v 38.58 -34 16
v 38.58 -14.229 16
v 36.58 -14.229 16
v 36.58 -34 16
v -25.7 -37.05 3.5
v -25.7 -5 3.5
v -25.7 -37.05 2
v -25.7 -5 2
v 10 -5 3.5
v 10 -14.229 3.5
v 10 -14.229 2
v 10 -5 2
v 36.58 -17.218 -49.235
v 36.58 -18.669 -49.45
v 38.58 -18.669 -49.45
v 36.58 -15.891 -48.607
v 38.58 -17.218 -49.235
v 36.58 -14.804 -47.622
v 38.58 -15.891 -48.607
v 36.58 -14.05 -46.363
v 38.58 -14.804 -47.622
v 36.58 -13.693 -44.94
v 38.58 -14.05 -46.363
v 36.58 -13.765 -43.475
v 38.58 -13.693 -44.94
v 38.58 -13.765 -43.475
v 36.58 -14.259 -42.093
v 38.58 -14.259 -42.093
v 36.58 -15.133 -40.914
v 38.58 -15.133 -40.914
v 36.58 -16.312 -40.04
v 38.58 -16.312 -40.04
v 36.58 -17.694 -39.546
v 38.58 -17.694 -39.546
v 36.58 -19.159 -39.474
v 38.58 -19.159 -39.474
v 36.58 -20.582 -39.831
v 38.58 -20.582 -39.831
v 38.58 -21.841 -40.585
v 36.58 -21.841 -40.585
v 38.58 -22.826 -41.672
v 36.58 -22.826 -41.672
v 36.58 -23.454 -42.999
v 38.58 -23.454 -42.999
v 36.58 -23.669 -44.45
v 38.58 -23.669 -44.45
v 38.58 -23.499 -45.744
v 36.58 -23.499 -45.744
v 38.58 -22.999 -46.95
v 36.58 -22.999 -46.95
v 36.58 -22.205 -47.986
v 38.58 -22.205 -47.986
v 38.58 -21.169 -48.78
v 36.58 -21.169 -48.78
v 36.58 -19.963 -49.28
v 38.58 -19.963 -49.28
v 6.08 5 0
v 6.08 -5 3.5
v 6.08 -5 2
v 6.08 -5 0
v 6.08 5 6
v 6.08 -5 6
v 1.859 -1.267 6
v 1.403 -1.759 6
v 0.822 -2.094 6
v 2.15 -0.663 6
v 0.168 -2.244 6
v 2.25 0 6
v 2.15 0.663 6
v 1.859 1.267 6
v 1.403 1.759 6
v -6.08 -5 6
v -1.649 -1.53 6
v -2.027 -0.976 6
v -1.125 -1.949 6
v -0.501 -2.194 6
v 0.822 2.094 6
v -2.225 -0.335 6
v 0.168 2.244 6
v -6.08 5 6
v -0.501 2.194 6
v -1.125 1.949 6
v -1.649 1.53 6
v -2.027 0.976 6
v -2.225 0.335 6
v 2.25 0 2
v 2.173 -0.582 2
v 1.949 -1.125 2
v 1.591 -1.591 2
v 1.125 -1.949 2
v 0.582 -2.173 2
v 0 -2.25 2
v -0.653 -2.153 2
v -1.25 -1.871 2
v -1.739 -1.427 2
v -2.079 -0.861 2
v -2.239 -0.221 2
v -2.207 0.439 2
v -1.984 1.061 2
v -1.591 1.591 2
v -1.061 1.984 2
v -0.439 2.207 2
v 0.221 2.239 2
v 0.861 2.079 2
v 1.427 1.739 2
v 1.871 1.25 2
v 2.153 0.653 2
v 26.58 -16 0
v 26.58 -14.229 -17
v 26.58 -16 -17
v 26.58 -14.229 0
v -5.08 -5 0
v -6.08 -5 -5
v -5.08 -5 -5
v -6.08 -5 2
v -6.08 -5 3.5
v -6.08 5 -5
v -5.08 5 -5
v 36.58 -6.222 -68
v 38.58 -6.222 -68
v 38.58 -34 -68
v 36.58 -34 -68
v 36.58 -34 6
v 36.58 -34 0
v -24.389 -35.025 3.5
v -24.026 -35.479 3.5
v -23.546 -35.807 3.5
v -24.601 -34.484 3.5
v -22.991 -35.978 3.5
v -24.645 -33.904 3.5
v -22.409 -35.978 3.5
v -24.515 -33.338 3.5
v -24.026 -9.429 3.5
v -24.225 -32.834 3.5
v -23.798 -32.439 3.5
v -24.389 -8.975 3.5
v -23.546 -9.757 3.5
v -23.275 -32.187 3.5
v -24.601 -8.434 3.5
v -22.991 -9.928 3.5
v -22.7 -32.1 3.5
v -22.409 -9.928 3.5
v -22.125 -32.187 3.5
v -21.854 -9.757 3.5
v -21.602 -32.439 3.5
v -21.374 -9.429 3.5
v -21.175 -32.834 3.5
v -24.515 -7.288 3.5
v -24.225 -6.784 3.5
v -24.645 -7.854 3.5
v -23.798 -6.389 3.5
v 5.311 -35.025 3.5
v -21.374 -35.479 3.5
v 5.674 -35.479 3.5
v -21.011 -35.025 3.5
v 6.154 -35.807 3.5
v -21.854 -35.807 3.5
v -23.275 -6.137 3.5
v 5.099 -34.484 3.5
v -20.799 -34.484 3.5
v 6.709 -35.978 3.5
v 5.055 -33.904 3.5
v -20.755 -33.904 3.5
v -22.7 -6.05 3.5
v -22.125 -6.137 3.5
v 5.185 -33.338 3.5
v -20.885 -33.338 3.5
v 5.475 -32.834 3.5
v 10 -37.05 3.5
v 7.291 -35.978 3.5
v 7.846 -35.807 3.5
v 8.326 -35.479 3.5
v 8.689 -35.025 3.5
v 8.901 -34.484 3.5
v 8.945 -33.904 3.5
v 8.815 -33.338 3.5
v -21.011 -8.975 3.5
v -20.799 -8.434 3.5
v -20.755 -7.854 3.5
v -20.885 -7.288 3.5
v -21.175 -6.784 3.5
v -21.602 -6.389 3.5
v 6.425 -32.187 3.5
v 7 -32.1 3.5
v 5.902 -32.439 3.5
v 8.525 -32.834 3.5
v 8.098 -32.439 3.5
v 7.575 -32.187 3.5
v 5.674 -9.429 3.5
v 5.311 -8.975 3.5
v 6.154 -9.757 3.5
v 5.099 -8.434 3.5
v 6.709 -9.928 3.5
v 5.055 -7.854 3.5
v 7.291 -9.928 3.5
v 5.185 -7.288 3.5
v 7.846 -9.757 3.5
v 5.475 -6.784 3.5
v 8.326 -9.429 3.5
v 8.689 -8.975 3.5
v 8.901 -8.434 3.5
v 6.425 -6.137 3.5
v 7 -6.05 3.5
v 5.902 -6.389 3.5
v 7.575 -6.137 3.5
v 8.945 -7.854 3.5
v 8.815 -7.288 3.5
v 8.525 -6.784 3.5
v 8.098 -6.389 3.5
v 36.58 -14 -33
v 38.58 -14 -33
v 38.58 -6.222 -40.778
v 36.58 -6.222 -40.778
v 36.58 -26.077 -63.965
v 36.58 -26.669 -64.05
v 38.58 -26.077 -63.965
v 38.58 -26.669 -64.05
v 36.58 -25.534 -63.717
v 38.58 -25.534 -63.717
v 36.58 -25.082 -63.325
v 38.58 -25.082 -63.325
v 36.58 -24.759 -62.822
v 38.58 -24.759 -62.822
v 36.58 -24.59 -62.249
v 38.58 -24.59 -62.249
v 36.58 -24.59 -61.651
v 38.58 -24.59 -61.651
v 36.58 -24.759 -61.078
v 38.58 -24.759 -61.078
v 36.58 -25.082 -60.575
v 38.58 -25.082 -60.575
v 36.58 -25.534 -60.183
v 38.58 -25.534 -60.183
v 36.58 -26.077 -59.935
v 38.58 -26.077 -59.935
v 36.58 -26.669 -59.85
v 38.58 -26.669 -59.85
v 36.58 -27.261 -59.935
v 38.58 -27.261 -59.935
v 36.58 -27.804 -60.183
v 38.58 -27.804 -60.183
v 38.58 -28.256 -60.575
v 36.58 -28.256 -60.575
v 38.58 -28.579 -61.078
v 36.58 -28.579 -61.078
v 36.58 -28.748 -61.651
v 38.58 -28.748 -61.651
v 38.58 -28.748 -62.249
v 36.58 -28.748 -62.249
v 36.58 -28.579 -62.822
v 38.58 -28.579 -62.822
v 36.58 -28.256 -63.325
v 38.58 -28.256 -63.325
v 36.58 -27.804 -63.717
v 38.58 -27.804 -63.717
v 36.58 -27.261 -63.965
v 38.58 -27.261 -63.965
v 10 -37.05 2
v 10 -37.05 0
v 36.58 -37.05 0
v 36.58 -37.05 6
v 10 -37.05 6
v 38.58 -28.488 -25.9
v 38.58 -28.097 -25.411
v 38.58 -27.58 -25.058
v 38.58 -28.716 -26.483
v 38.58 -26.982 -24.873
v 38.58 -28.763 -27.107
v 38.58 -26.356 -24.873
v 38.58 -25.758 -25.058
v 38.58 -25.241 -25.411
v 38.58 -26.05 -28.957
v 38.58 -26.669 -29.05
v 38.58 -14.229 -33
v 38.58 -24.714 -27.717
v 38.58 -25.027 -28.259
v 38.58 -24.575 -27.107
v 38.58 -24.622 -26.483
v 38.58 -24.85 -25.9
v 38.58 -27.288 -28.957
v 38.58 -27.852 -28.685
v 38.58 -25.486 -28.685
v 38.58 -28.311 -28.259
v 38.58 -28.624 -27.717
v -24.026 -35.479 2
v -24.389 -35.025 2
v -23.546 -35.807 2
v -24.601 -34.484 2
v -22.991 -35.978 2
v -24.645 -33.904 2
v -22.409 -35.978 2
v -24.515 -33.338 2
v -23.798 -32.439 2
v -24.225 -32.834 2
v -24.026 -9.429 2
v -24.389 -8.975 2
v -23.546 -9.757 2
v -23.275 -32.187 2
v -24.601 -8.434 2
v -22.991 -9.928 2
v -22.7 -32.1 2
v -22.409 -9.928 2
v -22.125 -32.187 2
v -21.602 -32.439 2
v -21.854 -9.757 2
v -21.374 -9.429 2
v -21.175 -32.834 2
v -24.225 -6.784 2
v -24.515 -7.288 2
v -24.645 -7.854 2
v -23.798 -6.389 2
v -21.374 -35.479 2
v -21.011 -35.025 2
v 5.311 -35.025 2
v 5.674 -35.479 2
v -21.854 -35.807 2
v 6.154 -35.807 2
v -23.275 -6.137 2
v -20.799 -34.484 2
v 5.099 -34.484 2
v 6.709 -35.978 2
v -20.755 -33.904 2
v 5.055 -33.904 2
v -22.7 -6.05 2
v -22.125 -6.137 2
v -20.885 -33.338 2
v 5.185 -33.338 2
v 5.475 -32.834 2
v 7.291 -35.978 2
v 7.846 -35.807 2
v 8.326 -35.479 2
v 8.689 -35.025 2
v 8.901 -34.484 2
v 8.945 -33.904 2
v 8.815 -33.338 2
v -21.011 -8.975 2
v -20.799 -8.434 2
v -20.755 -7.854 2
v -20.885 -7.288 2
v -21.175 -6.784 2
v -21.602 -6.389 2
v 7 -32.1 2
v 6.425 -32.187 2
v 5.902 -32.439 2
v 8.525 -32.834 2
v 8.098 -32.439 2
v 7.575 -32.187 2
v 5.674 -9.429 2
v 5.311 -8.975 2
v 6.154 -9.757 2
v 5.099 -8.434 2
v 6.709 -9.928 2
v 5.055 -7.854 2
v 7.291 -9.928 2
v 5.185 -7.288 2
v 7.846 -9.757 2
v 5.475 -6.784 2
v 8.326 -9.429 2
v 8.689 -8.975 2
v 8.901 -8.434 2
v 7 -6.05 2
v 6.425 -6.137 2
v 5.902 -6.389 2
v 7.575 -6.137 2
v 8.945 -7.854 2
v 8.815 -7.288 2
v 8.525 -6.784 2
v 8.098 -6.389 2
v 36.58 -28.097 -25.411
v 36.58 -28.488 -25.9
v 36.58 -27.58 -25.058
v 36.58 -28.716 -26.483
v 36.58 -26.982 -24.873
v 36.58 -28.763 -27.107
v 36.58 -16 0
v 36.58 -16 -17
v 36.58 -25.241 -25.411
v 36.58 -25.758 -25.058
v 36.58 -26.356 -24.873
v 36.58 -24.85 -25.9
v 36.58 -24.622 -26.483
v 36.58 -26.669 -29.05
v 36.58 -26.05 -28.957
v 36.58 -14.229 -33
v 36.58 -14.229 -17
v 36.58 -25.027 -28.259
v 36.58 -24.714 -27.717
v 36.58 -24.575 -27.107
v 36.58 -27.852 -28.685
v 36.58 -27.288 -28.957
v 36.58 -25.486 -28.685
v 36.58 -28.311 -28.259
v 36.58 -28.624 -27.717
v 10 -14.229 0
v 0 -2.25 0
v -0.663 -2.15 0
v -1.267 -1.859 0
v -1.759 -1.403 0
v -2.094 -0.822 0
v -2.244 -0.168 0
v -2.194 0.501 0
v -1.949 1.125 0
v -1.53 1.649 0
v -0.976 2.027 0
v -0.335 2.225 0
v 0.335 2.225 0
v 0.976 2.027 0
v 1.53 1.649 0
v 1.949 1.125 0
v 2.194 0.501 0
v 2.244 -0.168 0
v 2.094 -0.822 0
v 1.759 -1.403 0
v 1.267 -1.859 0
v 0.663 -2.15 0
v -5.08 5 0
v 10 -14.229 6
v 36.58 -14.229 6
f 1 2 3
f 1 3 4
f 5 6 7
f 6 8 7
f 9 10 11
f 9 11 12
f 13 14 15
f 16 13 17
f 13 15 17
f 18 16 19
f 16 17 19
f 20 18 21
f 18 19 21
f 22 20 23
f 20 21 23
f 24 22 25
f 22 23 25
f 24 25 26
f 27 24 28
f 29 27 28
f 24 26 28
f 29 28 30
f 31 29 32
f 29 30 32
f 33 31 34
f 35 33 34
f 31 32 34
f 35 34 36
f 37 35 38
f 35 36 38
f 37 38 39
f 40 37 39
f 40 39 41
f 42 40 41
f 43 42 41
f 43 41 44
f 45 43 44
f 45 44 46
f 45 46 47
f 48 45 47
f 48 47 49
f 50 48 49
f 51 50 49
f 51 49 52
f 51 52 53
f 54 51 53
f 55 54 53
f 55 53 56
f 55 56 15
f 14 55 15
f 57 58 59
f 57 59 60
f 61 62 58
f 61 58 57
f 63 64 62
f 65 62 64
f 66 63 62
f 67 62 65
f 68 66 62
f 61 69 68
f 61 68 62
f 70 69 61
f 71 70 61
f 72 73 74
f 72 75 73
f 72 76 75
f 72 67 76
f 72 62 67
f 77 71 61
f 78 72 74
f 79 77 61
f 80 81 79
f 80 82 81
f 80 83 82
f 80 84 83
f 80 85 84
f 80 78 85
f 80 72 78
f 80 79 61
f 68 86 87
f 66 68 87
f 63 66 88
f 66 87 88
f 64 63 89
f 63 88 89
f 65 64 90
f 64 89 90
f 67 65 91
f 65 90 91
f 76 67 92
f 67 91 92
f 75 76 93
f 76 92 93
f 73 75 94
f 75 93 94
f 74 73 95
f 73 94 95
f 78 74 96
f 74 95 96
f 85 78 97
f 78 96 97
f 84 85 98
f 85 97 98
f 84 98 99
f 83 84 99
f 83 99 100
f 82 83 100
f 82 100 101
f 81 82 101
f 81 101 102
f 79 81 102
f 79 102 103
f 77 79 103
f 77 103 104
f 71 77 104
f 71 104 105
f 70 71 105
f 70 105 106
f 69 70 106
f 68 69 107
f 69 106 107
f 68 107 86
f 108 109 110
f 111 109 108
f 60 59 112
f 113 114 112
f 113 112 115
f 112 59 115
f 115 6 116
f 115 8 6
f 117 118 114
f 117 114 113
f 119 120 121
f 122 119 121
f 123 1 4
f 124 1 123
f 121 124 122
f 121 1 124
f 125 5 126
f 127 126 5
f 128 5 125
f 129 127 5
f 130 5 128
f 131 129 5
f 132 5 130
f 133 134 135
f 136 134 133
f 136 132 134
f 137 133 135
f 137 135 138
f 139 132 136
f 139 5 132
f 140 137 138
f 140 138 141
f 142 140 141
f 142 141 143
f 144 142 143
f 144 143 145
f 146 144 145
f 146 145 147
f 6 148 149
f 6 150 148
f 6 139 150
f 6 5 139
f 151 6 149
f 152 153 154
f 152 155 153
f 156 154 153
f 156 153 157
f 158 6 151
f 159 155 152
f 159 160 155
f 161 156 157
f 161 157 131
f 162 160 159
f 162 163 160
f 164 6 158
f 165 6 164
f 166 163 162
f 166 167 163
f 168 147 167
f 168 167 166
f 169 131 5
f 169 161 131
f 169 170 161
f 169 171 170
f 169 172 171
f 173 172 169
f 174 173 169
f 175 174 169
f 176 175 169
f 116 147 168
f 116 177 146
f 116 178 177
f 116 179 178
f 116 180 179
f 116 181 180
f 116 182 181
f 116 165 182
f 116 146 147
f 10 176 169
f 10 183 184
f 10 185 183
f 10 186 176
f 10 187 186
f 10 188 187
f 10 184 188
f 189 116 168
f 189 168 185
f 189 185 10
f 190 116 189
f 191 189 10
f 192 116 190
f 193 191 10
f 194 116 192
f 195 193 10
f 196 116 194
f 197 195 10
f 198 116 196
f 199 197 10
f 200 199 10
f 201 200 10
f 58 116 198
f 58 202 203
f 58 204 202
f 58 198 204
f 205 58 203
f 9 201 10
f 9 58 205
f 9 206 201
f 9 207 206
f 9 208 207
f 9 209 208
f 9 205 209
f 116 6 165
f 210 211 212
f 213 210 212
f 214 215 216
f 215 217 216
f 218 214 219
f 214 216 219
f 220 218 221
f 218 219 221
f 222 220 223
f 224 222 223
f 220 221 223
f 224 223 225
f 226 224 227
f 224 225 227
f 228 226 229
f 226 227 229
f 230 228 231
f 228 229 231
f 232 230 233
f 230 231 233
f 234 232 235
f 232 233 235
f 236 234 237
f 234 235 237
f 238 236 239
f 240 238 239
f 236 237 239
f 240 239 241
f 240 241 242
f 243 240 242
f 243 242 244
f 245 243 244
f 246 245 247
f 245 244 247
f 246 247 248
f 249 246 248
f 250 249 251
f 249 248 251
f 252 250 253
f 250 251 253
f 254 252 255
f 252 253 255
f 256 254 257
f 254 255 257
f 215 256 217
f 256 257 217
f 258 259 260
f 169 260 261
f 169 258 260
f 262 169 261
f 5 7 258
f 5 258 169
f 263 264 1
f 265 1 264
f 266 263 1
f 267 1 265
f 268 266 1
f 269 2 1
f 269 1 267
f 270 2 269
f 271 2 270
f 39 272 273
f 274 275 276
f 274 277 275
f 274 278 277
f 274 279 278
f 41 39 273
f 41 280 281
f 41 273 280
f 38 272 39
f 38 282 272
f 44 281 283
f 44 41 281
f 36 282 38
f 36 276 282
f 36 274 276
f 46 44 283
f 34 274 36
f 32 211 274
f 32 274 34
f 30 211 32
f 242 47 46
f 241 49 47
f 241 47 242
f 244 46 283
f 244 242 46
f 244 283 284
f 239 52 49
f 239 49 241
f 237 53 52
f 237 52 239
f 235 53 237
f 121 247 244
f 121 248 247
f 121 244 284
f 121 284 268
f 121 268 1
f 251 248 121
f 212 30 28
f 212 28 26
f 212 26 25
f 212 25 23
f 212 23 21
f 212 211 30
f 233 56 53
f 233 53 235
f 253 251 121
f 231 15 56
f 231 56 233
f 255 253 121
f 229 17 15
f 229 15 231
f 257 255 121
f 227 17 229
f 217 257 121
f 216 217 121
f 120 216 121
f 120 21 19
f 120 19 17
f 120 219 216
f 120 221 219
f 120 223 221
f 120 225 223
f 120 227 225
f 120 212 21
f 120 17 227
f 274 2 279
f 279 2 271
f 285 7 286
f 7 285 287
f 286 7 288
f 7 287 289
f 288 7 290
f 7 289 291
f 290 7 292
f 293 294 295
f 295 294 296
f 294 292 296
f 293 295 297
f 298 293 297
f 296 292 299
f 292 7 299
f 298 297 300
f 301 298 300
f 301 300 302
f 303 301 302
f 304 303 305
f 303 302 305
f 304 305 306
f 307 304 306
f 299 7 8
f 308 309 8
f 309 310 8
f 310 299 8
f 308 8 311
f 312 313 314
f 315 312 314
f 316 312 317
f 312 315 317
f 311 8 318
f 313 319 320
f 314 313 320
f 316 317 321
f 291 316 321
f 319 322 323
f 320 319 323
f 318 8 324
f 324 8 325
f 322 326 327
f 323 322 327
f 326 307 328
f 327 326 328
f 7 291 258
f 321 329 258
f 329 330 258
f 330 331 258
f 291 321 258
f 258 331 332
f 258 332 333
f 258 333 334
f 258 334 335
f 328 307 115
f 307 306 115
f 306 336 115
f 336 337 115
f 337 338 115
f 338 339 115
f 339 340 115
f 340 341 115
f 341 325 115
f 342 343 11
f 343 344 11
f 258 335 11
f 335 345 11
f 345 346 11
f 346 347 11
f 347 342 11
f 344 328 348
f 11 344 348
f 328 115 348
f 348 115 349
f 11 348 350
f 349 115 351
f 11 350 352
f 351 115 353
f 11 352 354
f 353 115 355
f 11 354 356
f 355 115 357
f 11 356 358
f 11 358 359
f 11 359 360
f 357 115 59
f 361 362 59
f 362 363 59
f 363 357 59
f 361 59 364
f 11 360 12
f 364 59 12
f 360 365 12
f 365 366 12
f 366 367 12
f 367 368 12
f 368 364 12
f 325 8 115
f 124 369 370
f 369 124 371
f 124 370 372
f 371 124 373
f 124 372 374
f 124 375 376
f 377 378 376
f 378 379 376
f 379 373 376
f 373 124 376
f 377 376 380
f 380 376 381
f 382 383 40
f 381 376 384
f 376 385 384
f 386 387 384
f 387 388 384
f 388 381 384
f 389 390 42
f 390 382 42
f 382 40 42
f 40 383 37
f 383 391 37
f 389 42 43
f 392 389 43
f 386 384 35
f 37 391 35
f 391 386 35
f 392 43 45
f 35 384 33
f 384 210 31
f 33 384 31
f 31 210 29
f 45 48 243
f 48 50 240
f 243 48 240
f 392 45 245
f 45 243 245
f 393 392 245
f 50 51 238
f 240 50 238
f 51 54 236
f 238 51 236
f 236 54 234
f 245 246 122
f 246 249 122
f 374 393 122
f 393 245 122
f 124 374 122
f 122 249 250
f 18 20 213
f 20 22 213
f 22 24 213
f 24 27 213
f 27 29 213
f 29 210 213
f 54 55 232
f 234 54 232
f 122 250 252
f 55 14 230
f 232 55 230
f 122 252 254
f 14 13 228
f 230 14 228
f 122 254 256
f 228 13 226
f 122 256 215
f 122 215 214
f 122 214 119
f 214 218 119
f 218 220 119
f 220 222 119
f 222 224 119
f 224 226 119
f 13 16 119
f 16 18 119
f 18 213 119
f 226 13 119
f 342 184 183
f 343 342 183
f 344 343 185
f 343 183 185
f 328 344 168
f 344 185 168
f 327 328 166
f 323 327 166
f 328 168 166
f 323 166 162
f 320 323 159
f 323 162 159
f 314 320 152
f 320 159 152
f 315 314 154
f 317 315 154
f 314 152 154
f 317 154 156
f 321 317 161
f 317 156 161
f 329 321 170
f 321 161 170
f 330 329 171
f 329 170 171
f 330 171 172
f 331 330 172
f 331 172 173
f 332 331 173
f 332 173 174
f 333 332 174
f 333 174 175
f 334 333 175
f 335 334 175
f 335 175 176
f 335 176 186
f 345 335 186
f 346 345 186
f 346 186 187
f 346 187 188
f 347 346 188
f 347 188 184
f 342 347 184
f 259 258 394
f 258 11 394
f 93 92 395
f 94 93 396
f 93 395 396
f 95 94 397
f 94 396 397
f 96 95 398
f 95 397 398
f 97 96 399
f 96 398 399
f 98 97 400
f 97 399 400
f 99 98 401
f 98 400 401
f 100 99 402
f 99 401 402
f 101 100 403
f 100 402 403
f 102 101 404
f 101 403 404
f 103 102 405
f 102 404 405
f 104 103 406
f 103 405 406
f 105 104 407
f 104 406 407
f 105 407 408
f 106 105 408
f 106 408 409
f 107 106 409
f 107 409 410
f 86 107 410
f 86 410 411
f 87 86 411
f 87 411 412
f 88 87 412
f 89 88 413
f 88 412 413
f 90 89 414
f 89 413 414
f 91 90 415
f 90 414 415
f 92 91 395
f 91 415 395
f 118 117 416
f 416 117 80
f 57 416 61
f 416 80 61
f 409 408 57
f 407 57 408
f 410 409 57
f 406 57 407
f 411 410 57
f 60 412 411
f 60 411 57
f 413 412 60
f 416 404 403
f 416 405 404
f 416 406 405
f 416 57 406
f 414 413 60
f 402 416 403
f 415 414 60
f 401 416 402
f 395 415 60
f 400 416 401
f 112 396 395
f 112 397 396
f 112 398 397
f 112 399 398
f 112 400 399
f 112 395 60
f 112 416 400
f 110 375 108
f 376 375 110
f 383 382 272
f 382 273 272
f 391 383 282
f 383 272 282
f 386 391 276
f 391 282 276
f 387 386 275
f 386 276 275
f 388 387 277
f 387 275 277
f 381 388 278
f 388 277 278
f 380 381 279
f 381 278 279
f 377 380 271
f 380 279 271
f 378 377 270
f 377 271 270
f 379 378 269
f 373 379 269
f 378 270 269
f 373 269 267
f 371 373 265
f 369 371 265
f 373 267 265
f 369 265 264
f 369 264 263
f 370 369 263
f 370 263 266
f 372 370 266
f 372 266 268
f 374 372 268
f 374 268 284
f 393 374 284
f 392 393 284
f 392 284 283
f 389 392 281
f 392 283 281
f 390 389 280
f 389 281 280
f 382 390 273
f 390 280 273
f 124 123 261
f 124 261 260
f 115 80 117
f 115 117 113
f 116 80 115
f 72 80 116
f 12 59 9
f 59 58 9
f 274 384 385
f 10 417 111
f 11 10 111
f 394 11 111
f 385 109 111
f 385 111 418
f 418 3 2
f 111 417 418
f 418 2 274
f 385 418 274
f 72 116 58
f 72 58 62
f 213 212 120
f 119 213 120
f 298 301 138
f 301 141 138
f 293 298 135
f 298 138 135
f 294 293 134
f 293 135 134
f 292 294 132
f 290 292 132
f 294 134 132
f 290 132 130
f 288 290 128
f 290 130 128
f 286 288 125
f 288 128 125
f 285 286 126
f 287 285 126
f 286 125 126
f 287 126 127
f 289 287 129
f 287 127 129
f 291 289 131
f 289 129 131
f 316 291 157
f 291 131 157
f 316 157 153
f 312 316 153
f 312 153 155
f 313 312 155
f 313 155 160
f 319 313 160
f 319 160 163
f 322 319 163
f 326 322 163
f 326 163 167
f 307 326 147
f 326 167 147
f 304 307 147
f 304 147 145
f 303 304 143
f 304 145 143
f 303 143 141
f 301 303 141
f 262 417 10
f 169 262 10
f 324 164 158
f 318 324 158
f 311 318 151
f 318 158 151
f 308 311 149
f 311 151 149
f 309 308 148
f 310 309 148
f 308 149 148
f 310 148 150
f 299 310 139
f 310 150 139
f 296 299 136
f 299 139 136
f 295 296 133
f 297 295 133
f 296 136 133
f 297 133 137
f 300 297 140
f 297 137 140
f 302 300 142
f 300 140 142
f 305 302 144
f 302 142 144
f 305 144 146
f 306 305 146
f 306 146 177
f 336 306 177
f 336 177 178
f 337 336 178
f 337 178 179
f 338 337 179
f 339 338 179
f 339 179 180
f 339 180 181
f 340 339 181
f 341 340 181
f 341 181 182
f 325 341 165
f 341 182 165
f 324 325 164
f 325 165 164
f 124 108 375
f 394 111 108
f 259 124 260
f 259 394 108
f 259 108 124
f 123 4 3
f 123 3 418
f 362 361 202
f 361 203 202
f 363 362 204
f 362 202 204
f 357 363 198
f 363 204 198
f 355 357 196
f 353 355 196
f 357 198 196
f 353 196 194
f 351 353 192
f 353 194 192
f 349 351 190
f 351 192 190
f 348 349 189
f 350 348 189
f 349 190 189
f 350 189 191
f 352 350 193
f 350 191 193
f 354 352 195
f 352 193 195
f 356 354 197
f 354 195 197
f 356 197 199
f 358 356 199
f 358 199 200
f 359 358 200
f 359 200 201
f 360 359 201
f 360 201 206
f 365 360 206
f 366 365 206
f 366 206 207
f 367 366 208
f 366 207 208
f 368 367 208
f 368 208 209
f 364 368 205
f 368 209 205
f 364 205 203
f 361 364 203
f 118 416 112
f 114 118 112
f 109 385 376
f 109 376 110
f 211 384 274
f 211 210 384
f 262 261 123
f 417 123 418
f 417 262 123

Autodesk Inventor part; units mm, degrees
ref_plane "YZ Plane" through (0, 0, 0) normal (1, 0, 0) x (0, 1, 0)
ref_plane "XZ Plane" through (0, 0, 0) normal (0, 1, 0) x (-1, 0, 0)
ref_plane "XY Plane" through (0, 0, 0) normal (0, 0, 1) x (1, 0, 0)
sketch "Sketch14" plane through (0, 0, 0) normal (0, 0, 1) x (1, 0, 0)
  line L0 (0, 0) -> (-6.08, 0)
  line L1 (-6.08, 0) -> (0, 0)
  line L2 (0, 0) -> (6.08, 0)
  line L3 (-6.08, 0) -> (-6.08, 5)
  line L4 (-6.08, 0) -> (-1.08, 0) construction
  line L5 (-6.08, 5) -> (6.08, 5)
  line L6 (6.08, 5) -> (6.08, -5)
  line L7 (6.08, -5) -> (-6.08, -5)
  line L8 (-6.08, -5) -> (-6.08, 5)
  dimension "d66" = 6.08
  dimension "d67" = 6.08
  dimension "d68" = 5
  dimension "d69" = 90
  dimension "d70" = 12.16
  dimension "d71" = 10
extrude "Extrusion7" add sketch "Sketch14" along normal blind 2
sketch "Sketch15" plane through (0, 0, 2) normal (0, 0, 1) x (1, 0, 0)
  circle A0 centre (0, 0) radius 1.0665
hole "Hole4" at (0, 0, 2) direction (0, 0, -1) diameter 4.5 end through all clearance for "Flat Head Machine Screw" size "M4" standard "Ansi Metric M Profile"
sketch "Sketch16" plane through (0, 0, 2) normal (0, 0, 1) x (1, 0, 0)
  line L0 (6.08, 5) -> (-6.08, 5) projected
  line L1 (0, 5) -> (10, 5)
  line L2 (10, 5) -> (-25.7, 5)
  line L3 (-25.7, 5) -> (-25.7, 37.05)
  line L4 (-25.7, 37.05) -> (10, 37.05)
  line L5 (10, 37.05) -> (10, 5)
  line L6 (-6.08, -5) -> (6.08, -5) projected
  line L7 (0, -5) -> (10, -5)
  line L8 (10, -5) -> (-25.7, -5)
  line L9 (-25.7, -5) -> (-25.7, -37.05)
  line L10 (-25.7, -37.05) -> (10, -37.05)
  line L11 (10, -37.05) -> (10, -5)
  line L12 (-25.7, 37.05) -> (-22.7, 37.05)
  line L13 (-22.7, 37.05) -> (-22.7, 34.05)
  line L14 (-22.7, 34.05) -> (-25.7, 34.05)
  line L15 (-25.7, 34.05) -> (-25.7, 37.05)
  line L16 (-22.7, 34.05) -> (7, 34.05)
  line L17 (7, 34.05) -> (7, 8)
  line L18 (7, 8) -> (-22.7, 8)
  line L19 (-22.7, 8) -> (-22.7, 34.05)
  line L20 (-25.7, -37.05) -> (-22.7, -37.05)
  line L21 (-22.7, -37.05) -> (-22.7, -34.05)
  line L22 (-22.7, -34.05) -> (-25.7, -34.05)
  line L23 (-25.7, -34.05) -> (-25.7, -37.05)
  line L24 (-22.7, -34.05) -> (7, -34.05)
  line L25 (7, -34.05) -> (7, -8)
  line L26 (7, -8) -> (-22.7, -8)
  line L27 (-22.7, -8) -> (-22.7, -34.05)
  line L28 (-25.7, -5) -> (10, -5)
  line L29 (10, -5) -> (10, -37.05)
  line L30 (10, -37.05) -> (-25.7, -37.05)
  line L31 (-25.7, -37.05) -> (-25.7, -5)
  point P0 (0, 0)
  dimension "d81" = 10
  dimension "d82" = 35.7
  dimension "d83" = 32.05
  dimension "d84" = 35.7
  dimension "d85" = 32.05
  dimension "d86" = 3
  dimension "d87" = 3
  dimension "d88" = 29.7
  dimension "d89" = 26.05
  dimension "d90" = 3
  dimension "d91" = 3
  dimension "d92" = 29.7
  dimension "d93" = 26.05
  dimension "d172" = 10
extrude "Extrusion8" add sketch "Sketch16" along normal blind 1.5 contours L16 L17 L18 L19 | L0 L2 L3 L14 L13 L4 L5 L1 | L13 L14 L3 L4 | L27 L26 L25 L24 | L6 L7 L11 L10 L21 L22 L9 L8 | L22 L21 L10 L9
hole "Hole5" at (-22.7, 34.05, 2) at (-22.7, 8, 2) at (7, 8, 2) at (7, 34.05, 2) at (7, -8, 2) at (7, -34.05, 2) at (-22.7, -34.05, 2) at (-22.7, -8, 2) direction (0, 0, 1) diameter 3.9 end through all clearance for "Flat Head Machine Screw" size "M3.5" standard "Ansi Metric M Profile"
sketch "Sketch17" plane through (0, 0, 2) normal (0, 0, 1) x (1, 0, 0)
  circle A0 centre (0, 0) radius 2.25 projected
  line L0 (6.08, -5) -> (6.08, 5) projected
  line L1 (6.08, 5) -> (-6.08, 5) projected
  line L2 (-6.08, 5) -> (-6.08, -5) projected
  line L3 (-6.08, -5) -> (6.08, -5) projected
extrude "Extrusion9" add sketch "Sketch17" along normal blind 4
sketch "Sketch18" plane through (6.08, -5, 0) normal (1, 0, 0) x (0, 0, -1)
  line L0 (0, 0) -> (0, 10) projected
  line L1 (0, 10) -> (-2, 10) projected
  line L2 (-3.5, 10) -> (-2, 10) projected
  line L3 (-3.5, 10) -> (-6, 10) projected
  line L4 (-6, 0) -> (-6, 10) projected
  line L5 (-3.5, 0) -> (-6, 0) projected
  line L6 (-2, 0) -> (-3.5, 0) projected
  line L7 (0, 0) -> (-2, 0) projected
  point P0 (0, 5)
extrude "Extrusion10" add sketch "Sketch18" along normal blind 30
sketch "Sketch19" plane through (36.08, -5, 0) normal (1, 0, 0) x (0, 0, -1)
  line L0 (-6, 10) -> (-6, 0) projected
  line L1 (-6, 0) -> (-16, 0)
  line L2 (-16, 0) -> (-16, 50)
  line L3 (-16, 50) -> (29, 50)
  line L4 (29, 50) -> (29, 25)
  line L5 (29, 25) -> (0, 10)
  line L6 (0, 10) -> (0, 0) projected
  line L7 (0, 10) -> (0, 0)
  line L8 (0, 0) -> (-6, 0)
  point P0 (0, 5)
  dimension "d107" = 10
  dimension "d108" = 50
  dimension "d109" = 90
  dimension "d110" = 45
  dimension "d111" = 90
  dimension "d112" = 25
extrude "Extrusion11" add sketch "Sketch19" along normal blind 2.5
sketch "Sketch21" plane through (38.58, -5, 0) normal (1, 0, 0) x (0, 0, -1)
  line L0 (-3.5, 10) -> (-6, 10) projected
  line L1 (0, 10) -> (0, 24.05)
  line L2 (0, 10) -> (14.05, 10) construction
  line L3 (0, 24.05) -> (6.713, 24.05)
  point P0 (0, 5)
  point P1 (3, 10)
  point P2 (-2, 10)
  dimension "d118" = 14.05
  dimension "d119" = 90
  dimension "d120" = 6.713
  dimension "d121" = 90
hole "Hole6" at (38.58, 19.05, -6.713) direction (-1, 0, 0) diameter 10 end through all
sketch "Sketch22" plane through (38.58, -5, 0) normal (1, 0, 0) x (0, 0, -1)
  circle A0 centre (6.713, 24.05) radius 5 projected
  line L0 (6.713, 24.05) -> (6.713, 32.05)
  line L1 (6.713, 24.05) -> (14.713, 24.05) construction
  line L2 (6.713, 32.05) -> (24.213, 32.05)
  line L3 (24.213, 32.05) -> (-10.787, 32.05)
  point P0 (0, 5)
  dimension "d129" = 8
  dimension "d130" = 90
  dimension "d131" = 17.5
  dimension "d132" = 90
  dimension "d133" = 35
hole "Hole7" at (38.58, 27.05, 10.787) at (38.58, 27.05, -24.213) direction (-1, 0, 0) diameter 4.2 end through all
sketch "Sketch23" plane through (38.58, -5, 0) normal (1, 0, 0) x (0, 0, -1)
  line L0 (-3.5, 0) -> (-2, 0) projected
  line L1 (-2, 0) -> (-2, -9)
  line L2 (-2, 0) -> (7, 0) construction
  line L3 (-2, -9) -> (33, -9) construction
  line L4 (-2, -9) -> (33, -9)
  line L5 (-2, -9) -> (33, -9) construction
  line L6 (33, -9) -> (40.7782, -1.2218)
  line L7 (40.7782, -1.2218) -> (60.7782, -1.2218)
  line L8 (33, -9) -> (68, -9)
  line L9 (33, -9) -> (68, -9) construction
  line L10 (68, -9) -> (68, -1.2218)
  line L11 (68, -1.2218) -> (60.7782, -1.2218)
  line L12 (68, -9) -> (68, -29)
  line L13 (68, -9) -> (88, -9) construction
  line L14 (68, -29) -> (-2, -29)
  line L15 (-2, -29) -> (-2, -9)
  line L16 (33, -9) -> (44.45, -9)
  line L17 (44.45, -9) -> (44.45, -13.669)
  line L18 (44.45, -9) -> (49.119, -9) construction
  line L19 (44.45, -13.669) -> (44.45, -21.669)
  line L20 (44.45, -21.669) -> (61.95, -21.669)
  line L21 (61.95, -21.669) -> (26.95, -21.669)
  circle A0 centre (26.95, -21.669) radius 2.1
  circle A1 centre (61.95, -21.669) radius 2.1
  circle A2 centre (44.45, -13.669) radius 5
  point P0 (0, 5)
  dimension "d141" = 9
  dimension "d142" = 90
  dimension "d145" = 35
  dimension "d146" = 0
  dimension "d147" = 11
  dimension "d148" = 135
  dimension "d149" = 20
  dimension "d150" = 35
  dimension "d151" = 0
  dimension "d152" = 20
  dimension "d153" = 90
  dimension "d154" = 90
  dimension "d155" = 11.45
  dimension "d156" = 4.669
  dimension "d157" = 90
  dimension "d158" = 8
  dimension "d159" = 17.5
  dimension "d160" = 35
  dimension "d161" = 4.2
  dimension "d162" = 4.2
  dimension "d163" = 10
extrude "Extrusion13" add sketch "Sketch23" against normal blind 2 contours L4 L8 A2 L12 L14 L15 | L6 L7 L11 L10 L8 A2
sketch "Sketch24" plane through (38.58, -5, 0) normal (1, 0, 0) x (0, 0, -1)
  line L0 (-16, 50) -> (-16, 0) projected
  line L1 (-16, 0) -> (-16, -29)
  line L2 (68, -29) -> (-2, -29) projected
  line L3 (-16, -29) -> (-2, -29)
  line L4 (0, 0) -> (-2, 0) projected
  line L5 (-2, -29) -> (-2, 0)
  line L6 (-16, 0) -> (0, 0) projected
  line L7 (-2, 0) -> (-16, 0)
  point P0 (0, 5)
  point P1 (3, 0)
extrude "Extrusion14" add sketch "Sketch24" against normal blind 2
sketch "Sketch25" plane through (36.58, -5, 0) normal (-1, 0, 0) x (0, 0, 1)
  line L0 (2, -9) -> (-33, -9) projected
  line L1 (-33, -9) -> (2, -9)
  line L2 (2, -9) -> (2, -11)
  line L3 (2, -11) -> (-33, -11)
  line L4 (-33, -11) -> (-33, -9)
  line L5 (2, -11) -> (6, -11)
  line L6 (6, -11) -> (6, 0)
  line L7 (6, 0) -> (2, 0)
  line L8 (2, 0) -> (2, -11)
  point P0 (0, 5)
  point P1 (2, -9)
  dimension "d168" = 35
  dimension "d169" = 2
extrude "Extrusion15" add sketch "Sketch25" along normal blind 10
sketch "Sketch26" plane through (38.58, -5, 0) normal (1, 0, 0) x (0, 0, -1)
  line L0 (29, 50) -> (-16, 50) projected
  line L1 (-16, 50) -> (29, 50)
  line L2 (29, 50) -> (29, 10)
  line L3 (29, 10) -> (-16, 10)
  line L4 (-16, 10) -> (-16, 50)
  dimension "d173" = 40
extrude "Extrusion16" cut sketch "Sketch26" against normal up to surface (64.28 mm away)
sketch "Sketch27" plane through (10, -37.05, 2) normal (1, 0, 0) x (0, 0, -1)
  line L0 (-1.5, 0) -> (-4, 0)
  line L1 (0, 32.05) -> (-4, 32.05) projected
  line L2 (-4, 0) -> (-4, 32.05)
  line L3 (0, 32.05) -> (2, 32.05) projected
  line L4 (-4, 32.05) -> (2, 32.05)
  line L5 (2, 32.05) -> (2, 0)
  line L6 (2, 0) -> (-1.5, 0)
  point P0 (2, 37.05)
extrude "Extrusion17" add sketch "Sketch27" along normal up to surface (26.58 mm away)
sketch "Sketch28" plane through (36.08, -5, 16) normal (0, 0, 1) x (1, 0, 0)
  line L0 (2.5, 0) -> (2.5, 10) projected
  line L1 (-26.08, -32.05) -> (-26.08, 0) projected
  line L2 (2.5, 10) -> (-26.08, 10)
  line L3 (-26.08, 10) -> (-26.08, -9.2291)
  line L4 (-26.08, -9.2291) -> (2.5, -9.2291)
  line L5 (2.5, -9.2291) -> (2.5, 10)
  point P0 (-36.08, 5)
extrude "Extrusion18" cut sketch "Sketch28" against normal up to surface (49 mm away)
sketch "Sketch29" plane through (0, 0, 6) normal (0, 0, 1) x (1, 0, 0)
  line L0 (-6.08, 5) -> (10, 5) projected
  line L1 (-6.08, -5) -> (6.08, -5)
  line L2 (6.08, -5) -> (6.08, 5)
  line L3 (6.08, 5) -> (-6.08, 5)
  line L4 (-6.08, 5) -> (-6.08, -5)
  line L5 (10, 5) -> (6.08, 5)
  line L6 (6.08, 5) -> (6.08, -5)
  line L7 (6.08, -5) -> (10, -5)
  line L8 (10, -5) -> (10, 5)
  point P0 (0, 0)
  dimension "d180" = 12.16
extrude "Extrusion19" cut sketch "Sketch29" against normal blind 10 contours L0 L8 L7 L2
sketch "Sketch30" plane through (36.58, -14.2291, 16) normal (0, 1, 0) x (1, 0, 0)
  line L0 (-10, 49) -> (-10, 16) projected
  line L1 (0, 84) -> (0, 16) projected
  line L2 (-10, 49) -> (0, 49)
  line L3 (0, 49) -> (0, 33)
  line L4 (0, 33) -> (-10, 33)
  line L5 (-10, 33) -> (-10, 49)
  point P0 (-36.58, 16)
  dimension "d183" = 16
extrude "Extrusion20" cut sketch "Sketch30" against normal blind 10
sketch "Sketch31" plane through (0, 0, 0) normal (0, 0, -1) x (-1, 0, 0)
  line L0 (6.08, 5) -> (6.08, -5) projected
  line L1 (-6.08, -5) -> (6.08, -5) projected
  line L2 (6.08, 5) -> (5.08, 5)
  line L3 (5.08, 5) -> (5.08, -5)
  line L4 (5.08, -5) -> (6.08, -5)
  line L5 (6.08, -5) -> (6.08, 5)
  point P0 (0, 0)
  dimension "d186" = 1
extrude "Extrusion21" add sketch "Sketch31" along normal blind 5
properties part number "Shelf_half_left"
